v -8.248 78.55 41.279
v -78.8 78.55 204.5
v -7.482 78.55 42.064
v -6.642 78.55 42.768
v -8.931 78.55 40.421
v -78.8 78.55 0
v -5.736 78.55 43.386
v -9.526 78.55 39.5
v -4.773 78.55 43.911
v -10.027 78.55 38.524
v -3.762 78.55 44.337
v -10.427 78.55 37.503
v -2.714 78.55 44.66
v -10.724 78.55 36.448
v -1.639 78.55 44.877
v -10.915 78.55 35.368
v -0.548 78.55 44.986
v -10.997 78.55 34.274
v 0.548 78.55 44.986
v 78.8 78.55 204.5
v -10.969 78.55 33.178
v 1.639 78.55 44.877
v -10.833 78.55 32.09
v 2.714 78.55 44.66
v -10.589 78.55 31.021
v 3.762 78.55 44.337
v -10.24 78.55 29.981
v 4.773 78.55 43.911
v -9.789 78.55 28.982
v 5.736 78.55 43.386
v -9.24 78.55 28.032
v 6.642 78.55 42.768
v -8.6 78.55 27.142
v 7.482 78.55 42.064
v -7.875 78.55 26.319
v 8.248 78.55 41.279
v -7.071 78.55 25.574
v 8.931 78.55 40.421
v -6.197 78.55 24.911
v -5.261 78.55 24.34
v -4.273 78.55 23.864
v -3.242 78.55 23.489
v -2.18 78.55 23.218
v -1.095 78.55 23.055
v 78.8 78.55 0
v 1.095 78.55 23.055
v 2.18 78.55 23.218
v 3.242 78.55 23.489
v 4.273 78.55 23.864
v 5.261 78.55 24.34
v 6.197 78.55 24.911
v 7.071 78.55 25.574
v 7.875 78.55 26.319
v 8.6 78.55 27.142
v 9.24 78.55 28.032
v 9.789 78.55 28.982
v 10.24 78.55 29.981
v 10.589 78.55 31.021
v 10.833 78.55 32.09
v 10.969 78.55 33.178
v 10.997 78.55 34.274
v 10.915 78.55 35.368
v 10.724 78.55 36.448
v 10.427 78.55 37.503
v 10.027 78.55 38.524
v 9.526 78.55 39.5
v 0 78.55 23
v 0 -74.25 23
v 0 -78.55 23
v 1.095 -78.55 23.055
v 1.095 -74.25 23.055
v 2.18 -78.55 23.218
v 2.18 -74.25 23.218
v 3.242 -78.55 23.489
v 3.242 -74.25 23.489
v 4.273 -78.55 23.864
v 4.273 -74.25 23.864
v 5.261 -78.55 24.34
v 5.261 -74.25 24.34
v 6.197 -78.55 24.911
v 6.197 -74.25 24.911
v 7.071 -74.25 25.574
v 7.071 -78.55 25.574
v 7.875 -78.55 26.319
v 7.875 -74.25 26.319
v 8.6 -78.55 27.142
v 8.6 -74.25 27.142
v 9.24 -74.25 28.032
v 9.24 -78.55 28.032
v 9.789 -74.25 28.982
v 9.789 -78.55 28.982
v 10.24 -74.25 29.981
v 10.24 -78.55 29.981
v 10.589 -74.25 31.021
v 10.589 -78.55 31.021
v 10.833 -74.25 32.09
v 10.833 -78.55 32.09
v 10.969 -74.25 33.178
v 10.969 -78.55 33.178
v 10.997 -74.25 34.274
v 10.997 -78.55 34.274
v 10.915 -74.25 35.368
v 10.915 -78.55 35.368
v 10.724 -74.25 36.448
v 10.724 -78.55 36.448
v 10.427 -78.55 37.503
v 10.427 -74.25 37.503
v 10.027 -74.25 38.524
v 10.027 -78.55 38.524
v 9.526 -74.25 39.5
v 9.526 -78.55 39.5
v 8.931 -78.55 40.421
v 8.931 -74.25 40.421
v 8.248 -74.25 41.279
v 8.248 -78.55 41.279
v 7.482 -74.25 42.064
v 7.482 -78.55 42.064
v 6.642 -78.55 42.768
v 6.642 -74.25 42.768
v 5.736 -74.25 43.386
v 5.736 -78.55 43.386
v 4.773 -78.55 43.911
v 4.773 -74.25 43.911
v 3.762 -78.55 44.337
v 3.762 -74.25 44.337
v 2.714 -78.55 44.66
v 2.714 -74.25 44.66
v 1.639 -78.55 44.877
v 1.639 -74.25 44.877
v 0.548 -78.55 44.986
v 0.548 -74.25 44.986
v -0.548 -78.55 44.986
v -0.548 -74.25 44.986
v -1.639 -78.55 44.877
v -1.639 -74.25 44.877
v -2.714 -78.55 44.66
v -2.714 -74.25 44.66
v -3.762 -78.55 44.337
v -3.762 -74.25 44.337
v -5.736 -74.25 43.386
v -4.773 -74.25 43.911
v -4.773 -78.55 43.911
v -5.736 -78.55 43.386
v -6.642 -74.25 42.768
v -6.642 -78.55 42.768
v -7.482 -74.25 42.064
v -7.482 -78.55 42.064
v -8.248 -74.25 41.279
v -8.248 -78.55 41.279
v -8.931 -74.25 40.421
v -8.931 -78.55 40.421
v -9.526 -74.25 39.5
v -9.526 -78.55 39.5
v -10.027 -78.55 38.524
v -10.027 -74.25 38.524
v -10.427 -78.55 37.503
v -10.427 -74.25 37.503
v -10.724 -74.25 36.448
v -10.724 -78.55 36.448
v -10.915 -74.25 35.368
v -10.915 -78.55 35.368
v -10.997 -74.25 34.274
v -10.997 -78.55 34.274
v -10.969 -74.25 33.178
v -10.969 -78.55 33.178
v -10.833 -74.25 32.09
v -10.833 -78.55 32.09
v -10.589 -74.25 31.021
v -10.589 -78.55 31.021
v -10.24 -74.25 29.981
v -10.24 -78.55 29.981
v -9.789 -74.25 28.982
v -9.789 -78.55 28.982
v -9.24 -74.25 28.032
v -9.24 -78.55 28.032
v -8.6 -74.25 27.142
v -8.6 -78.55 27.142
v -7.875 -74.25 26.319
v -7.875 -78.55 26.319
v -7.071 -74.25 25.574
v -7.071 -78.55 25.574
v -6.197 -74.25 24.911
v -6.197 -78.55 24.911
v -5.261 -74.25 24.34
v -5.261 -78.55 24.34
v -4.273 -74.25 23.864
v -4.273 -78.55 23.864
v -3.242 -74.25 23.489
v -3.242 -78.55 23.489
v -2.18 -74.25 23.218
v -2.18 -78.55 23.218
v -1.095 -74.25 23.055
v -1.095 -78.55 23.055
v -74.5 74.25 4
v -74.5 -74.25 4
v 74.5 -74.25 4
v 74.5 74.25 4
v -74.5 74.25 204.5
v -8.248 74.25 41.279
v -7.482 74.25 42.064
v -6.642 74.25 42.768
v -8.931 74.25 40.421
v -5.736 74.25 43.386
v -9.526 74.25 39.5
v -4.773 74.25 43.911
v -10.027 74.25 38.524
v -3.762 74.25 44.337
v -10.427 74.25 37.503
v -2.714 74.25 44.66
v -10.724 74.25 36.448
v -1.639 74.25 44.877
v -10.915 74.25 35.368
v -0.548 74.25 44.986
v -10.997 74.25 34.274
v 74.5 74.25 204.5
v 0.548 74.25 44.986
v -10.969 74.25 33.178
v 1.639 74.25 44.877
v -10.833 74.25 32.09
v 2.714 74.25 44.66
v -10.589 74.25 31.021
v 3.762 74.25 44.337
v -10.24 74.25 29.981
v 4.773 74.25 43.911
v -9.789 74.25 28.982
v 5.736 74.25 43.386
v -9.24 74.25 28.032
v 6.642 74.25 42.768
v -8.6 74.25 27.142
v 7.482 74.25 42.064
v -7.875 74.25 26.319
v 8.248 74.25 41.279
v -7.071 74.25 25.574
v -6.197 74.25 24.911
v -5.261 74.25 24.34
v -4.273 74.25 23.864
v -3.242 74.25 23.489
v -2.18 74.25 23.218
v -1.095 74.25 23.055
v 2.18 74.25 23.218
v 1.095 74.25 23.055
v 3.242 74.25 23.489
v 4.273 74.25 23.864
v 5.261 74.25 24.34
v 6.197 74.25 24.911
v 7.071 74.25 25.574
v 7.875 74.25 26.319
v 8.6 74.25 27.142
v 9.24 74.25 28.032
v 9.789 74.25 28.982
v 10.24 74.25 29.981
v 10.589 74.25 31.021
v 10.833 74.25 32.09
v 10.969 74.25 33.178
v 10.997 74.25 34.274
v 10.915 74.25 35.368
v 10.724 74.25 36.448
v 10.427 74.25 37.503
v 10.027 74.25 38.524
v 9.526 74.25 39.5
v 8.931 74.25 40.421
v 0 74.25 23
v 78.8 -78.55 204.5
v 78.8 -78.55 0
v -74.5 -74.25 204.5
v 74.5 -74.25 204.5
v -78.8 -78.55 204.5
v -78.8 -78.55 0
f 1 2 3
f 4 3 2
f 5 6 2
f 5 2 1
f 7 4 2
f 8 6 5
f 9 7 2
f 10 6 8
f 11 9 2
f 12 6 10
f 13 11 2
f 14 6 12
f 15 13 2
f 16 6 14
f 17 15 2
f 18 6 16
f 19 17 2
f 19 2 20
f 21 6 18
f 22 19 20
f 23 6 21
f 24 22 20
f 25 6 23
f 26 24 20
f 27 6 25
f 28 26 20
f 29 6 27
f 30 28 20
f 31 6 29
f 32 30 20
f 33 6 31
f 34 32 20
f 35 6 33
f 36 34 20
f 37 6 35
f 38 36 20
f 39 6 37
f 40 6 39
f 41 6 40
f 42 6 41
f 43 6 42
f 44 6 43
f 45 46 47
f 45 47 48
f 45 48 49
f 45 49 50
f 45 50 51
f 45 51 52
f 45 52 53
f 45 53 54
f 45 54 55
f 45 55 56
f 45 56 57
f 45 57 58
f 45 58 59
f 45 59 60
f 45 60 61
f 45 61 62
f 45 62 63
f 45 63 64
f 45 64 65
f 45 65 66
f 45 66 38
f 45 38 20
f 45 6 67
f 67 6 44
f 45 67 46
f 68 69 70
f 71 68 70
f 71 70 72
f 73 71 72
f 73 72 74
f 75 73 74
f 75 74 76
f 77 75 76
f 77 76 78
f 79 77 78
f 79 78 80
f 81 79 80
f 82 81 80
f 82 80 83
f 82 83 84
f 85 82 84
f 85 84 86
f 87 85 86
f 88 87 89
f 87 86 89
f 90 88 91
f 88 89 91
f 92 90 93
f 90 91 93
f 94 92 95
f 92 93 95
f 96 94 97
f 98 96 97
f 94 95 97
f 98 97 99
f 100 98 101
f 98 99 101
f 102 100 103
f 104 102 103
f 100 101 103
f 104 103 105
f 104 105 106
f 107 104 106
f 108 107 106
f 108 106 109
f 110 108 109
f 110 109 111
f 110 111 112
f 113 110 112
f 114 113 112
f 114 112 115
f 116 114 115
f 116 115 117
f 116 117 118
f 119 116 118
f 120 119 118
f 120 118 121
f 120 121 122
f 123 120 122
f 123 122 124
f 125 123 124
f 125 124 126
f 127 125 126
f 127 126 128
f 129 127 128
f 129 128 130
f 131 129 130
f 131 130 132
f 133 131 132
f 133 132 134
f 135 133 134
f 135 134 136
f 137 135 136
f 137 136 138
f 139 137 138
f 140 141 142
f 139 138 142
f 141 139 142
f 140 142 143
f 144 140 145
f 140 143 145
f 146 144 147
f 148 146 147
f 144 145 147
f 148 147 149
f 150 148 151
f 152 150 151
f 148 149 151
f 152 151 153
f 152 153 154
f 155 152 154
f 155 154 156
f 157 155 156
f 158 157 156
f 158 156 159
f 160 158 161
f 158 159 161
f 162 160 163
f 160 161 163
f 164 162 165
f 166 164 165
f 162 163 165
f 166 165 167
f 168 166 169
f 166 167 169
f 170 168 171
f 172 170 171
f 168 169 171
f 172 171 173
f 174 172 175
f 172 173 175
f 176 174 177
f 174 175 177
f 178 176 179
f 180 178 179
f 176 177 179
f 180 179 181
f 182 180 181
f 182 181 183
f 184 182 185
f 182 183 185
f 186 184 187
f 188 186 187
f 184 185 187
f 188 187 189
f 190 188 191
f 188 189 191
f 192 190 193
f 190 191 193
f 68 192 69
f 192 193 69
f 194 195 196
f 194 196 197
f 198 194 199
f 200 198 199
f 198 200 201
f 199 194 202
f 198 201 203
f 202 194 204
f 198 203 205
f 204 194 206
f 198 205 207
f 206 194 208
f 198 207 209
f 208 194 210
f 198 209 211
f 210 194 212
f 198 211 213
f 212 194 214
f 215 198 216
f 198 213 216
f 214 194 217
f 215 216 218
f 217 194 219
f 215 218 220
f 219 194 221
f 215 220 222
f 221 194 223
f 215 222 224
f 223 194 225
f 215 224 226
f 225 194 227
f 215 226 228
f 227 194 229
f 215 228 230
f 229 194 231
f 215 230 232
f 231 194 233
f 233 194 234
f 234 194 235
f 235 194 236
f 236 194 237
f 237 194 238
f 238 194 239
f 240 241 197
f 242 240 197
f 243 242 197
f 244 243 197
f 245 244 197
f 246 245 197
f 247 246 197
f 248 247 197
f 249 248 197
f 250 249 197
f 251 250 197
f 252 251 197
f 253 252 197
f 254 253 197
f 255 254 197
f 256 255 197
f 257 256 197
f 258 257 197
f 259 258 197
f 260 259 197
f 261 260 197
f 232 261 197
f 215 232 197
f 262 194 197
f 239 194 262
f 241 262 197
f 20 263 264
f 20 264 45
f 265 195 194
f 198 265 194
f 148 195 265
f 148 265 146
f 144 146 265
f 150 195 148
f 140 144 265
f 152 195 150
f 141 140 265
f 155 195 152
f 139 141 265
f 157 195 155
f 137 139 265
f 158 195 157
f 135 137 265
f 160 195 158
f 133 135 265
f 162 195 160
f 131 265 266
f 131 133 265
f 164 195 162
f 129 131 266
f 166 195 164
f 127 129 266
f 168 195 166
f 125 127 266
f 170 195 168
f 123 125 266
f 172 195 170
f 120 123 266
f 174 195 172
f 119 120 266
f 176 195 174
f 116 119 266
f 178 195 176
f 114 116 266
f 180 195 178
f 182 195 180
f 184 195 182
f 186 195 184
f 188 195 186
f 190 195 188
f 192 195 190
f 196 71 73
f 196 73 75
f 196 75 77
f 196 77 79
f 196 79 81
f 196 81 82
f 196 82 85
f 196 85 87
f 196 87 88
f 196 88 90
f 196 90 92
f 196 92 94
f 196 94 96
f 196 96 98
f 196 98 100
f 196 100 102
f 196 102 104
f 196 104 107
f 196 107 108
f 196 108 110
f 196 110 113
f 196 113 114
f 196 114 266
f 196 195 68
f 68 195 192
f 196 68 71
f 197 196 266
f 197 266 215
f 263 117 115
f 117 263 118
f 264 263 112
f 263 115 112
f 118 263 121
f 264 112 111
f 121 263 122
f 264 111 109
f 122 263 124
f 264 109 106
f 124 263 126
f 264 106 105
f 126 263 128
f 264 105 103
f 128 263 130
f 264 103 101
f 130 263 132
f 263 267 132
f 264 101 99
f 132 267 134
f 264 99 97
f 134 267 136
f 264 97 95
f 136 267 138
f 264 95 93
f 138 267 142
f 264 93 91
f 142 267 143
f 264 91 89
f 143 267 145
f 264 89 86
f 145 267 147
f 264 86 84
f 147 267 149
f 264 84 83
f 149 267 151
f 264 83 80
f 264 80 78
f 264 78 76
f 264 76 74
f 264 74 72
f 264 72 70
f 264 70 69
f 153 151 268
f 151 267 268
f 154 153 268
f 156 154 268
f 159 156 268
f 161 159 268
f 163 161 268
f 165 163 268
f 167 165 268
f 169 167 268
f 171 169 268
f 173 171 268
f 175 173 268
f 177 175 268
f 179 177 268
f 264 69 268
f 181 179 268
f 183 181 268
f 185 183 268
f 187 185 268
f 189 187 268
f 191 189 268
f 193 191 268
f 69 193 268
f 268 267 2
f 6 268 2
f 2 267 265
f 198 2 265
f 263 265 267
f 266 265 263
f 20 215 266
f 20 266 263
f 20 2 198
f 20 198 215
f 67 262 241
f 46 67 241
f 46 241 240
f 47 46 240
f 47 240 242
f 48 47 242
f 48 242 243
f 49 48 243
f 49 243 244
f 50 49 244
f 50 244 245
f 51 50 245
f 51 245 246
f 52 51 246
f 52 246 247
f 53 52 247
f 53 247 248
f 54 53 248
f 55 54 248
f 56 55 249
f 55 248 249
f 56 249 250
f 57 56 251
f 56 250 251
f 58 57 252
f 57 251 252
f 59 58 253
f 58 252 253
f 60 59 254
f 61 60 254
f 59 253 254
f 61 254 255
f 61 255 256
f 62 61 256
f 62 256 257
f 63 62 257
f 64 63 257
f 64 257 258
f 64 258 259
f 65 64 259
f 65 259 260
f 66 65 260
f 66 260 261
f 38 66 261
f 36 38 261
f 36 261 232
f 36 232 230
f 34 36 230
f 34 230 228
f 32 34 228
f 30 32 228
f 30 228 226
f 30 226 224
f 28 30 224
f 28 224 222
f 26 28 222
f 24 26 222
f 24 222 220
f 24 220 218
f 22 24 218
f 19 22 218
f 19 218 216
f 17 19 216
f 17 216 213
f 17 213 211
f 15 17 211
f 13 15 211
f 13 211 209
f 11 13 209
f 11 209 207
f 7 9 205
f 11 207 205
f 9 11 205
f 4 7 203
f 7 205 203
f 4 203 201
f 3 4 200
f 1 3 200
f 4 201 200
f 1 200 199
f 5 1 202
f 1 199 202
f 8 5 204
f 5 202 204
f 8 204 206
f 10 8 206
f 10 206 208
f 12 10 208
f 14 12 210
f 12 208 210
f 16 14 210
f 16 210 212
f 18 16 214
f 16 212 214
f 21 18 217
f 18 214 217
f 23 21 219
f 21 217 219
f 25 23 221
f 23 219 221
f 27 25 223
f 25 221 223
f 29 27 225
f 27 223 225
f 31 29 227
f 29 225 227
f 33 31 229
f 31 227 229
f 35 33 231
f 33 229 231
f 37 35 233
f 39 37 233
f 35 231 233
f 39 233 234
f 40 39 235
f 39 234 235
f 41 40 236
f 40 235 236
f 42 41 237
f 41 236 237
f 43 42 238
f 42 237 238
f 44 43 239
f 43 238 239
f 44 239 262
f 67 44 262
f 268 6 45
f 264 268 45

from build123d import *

# Parameters (mm, degrees)
CROQUIS1_W              = 157.6
CROQUIS1_H              = 157.1
CROQUIS1_W_2            = 149
CROQUIS1_H_2            = 148.5
SALIENTE_EXTRUIR1_DEPTH = 204.5
CROQUIS2_W              = 4
CROQUIS2_H              = 157.1
SALIENTE_EXTRUIR2_DEPTH = 149
CROQUIS3_R              = 11
CORTAR_EXTRUIR1_DEPTH   = 270.648104017


with BuildPart() as part:
    # Croquis1 → Saliente-Extruir1 (new body)
    with BuildSketch(Plane.XY):
        Rectangle(CROQUIS1_W, CROQUIS1_H)
        Rectangle(CROQUIS1_W_2, CROQUIS1_H_2, mode=Mode.SUBTRACT)
    extrude(amount=SALIENTE_EXTRUIR1_DEPTH)

    # Croquis2 → Saliente-Extruir2 (add)
    with BuildSketch(Plane(origin=(-74.5, 0, 0), x_dir=(0, 0, -1), z_dir=(1, 0, 0))):
        with Locations((-2, 0)):
            Rectangle(CROQUIS2_W, CROQUIS2_H)
    extrude(amount=SALIENTE_EXTRUIR2_DEPTH)

    # Croquis3 → Cortar-Extruir1 (cut, through all)
    with BuildSketch(Plane.XZ.offset(78.55)):
        with Locations(Location((0, 34, 0), (0, 0, 270))):
            Circle(CROQUIS3_R)
    extrude(amount=-CORTAR_EXTRUIR1_DEPTH, mode=Mode.SUBTRACT)


solid = part.part
